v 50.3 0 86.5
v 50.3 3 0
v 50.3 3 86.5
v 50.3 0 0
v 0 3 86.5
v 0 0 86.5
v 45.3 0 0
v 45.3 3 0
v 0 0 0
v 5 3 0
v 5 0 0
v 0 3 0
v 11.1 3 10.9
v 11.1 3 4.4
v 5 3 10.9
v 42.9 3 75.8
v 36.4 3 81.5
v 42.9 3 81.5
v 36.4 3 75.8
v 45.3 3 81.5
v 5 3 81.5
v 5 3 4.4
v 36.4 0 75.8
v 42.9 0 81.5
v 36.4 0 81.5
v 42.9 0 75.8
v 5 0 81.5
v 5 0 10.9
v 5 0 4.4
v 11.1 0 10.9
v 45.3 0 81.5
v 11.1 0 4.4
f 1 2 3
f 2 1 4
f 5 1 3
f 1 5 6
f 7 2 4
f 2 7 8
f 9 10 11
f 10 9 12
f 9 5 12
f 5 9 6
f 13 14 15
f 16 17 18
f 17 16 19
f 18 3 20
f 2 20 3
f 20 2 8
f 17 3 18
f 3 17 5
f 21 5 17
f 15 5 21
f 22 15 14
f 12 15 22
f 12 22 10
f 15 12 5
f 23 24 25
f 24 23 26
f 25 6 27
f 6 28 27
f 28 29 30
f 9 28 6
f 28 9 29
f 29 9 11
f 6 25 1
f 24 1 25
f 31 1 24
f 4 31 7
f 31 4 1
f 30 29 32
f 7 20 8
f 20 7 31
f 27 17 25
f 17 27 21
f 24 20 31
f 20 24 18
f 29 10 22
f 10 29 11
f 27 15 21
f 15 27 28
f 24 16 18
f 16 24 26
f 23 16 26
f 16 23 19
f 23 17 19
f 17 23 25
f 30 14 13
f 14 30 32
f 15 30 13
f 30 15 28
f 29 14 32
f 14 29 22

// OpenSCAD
//back panel cutout for a flex-atx psu.
//this is just a simple panel with screw hole cutouts and power/fan cutout.
//not the full model, only for power and screw connections.

/*
// next 2 lines used only by my 'on save' script. can be ignored otherwise.
// AUTO-V
version = "v0.1-2026/05/24r00";
*/

$fn = 64;

panel_thickness = 3.0;
panel_width = 40.3;
panel_height = 81.5;
panel_rim_width = 5;
panel_rim_thickness = 5;

screw_hole_diameter = 3.5; //#6-32 unc
screw_tab_width = 6.5;
screw_tab_height = 6.5;


module basic_panel() {
    difference() {
        cube([panel_width+(2 * panel_rim_width), panel_thickness, panel_height+panel_rim_width], center = false);
        translate([panel_rim_width, -0.1, 0]) {
            cube([panel_width, panel_thickness+0.2, panel_height], center = false);
        }
    }
}

module screw_hole() {
    difference() {
        cube([screw_tab_width, panel_thickness, screw_tab_height], center = false);
        translate([screw_tab_width/2, -0.1, screw_tab_height/2]) {
            rotate([90, 0, 0]) {
                translate([0, 0, -(panel_thickness/2)-0.1]) {
                    %cylinder(h = panel_thickness + 0.2, d = screw_hole_diameter, center = true);
                }
            }
        }
    }
}

basic_panel();
translate([40.3-3.9, 0, 81.5-5.7]) {
    screw_hole();
}
translate([4.6, 0, 4.4]) {
    screw_hole();
}
translate([4.6, 0, 4.4]) {
    screw_hole();
}
translate([4.6, 0, 4.4]) {
    screw_hole();
}
translate([4.6, 0, 4.4]) {
    screw_hole();
}
